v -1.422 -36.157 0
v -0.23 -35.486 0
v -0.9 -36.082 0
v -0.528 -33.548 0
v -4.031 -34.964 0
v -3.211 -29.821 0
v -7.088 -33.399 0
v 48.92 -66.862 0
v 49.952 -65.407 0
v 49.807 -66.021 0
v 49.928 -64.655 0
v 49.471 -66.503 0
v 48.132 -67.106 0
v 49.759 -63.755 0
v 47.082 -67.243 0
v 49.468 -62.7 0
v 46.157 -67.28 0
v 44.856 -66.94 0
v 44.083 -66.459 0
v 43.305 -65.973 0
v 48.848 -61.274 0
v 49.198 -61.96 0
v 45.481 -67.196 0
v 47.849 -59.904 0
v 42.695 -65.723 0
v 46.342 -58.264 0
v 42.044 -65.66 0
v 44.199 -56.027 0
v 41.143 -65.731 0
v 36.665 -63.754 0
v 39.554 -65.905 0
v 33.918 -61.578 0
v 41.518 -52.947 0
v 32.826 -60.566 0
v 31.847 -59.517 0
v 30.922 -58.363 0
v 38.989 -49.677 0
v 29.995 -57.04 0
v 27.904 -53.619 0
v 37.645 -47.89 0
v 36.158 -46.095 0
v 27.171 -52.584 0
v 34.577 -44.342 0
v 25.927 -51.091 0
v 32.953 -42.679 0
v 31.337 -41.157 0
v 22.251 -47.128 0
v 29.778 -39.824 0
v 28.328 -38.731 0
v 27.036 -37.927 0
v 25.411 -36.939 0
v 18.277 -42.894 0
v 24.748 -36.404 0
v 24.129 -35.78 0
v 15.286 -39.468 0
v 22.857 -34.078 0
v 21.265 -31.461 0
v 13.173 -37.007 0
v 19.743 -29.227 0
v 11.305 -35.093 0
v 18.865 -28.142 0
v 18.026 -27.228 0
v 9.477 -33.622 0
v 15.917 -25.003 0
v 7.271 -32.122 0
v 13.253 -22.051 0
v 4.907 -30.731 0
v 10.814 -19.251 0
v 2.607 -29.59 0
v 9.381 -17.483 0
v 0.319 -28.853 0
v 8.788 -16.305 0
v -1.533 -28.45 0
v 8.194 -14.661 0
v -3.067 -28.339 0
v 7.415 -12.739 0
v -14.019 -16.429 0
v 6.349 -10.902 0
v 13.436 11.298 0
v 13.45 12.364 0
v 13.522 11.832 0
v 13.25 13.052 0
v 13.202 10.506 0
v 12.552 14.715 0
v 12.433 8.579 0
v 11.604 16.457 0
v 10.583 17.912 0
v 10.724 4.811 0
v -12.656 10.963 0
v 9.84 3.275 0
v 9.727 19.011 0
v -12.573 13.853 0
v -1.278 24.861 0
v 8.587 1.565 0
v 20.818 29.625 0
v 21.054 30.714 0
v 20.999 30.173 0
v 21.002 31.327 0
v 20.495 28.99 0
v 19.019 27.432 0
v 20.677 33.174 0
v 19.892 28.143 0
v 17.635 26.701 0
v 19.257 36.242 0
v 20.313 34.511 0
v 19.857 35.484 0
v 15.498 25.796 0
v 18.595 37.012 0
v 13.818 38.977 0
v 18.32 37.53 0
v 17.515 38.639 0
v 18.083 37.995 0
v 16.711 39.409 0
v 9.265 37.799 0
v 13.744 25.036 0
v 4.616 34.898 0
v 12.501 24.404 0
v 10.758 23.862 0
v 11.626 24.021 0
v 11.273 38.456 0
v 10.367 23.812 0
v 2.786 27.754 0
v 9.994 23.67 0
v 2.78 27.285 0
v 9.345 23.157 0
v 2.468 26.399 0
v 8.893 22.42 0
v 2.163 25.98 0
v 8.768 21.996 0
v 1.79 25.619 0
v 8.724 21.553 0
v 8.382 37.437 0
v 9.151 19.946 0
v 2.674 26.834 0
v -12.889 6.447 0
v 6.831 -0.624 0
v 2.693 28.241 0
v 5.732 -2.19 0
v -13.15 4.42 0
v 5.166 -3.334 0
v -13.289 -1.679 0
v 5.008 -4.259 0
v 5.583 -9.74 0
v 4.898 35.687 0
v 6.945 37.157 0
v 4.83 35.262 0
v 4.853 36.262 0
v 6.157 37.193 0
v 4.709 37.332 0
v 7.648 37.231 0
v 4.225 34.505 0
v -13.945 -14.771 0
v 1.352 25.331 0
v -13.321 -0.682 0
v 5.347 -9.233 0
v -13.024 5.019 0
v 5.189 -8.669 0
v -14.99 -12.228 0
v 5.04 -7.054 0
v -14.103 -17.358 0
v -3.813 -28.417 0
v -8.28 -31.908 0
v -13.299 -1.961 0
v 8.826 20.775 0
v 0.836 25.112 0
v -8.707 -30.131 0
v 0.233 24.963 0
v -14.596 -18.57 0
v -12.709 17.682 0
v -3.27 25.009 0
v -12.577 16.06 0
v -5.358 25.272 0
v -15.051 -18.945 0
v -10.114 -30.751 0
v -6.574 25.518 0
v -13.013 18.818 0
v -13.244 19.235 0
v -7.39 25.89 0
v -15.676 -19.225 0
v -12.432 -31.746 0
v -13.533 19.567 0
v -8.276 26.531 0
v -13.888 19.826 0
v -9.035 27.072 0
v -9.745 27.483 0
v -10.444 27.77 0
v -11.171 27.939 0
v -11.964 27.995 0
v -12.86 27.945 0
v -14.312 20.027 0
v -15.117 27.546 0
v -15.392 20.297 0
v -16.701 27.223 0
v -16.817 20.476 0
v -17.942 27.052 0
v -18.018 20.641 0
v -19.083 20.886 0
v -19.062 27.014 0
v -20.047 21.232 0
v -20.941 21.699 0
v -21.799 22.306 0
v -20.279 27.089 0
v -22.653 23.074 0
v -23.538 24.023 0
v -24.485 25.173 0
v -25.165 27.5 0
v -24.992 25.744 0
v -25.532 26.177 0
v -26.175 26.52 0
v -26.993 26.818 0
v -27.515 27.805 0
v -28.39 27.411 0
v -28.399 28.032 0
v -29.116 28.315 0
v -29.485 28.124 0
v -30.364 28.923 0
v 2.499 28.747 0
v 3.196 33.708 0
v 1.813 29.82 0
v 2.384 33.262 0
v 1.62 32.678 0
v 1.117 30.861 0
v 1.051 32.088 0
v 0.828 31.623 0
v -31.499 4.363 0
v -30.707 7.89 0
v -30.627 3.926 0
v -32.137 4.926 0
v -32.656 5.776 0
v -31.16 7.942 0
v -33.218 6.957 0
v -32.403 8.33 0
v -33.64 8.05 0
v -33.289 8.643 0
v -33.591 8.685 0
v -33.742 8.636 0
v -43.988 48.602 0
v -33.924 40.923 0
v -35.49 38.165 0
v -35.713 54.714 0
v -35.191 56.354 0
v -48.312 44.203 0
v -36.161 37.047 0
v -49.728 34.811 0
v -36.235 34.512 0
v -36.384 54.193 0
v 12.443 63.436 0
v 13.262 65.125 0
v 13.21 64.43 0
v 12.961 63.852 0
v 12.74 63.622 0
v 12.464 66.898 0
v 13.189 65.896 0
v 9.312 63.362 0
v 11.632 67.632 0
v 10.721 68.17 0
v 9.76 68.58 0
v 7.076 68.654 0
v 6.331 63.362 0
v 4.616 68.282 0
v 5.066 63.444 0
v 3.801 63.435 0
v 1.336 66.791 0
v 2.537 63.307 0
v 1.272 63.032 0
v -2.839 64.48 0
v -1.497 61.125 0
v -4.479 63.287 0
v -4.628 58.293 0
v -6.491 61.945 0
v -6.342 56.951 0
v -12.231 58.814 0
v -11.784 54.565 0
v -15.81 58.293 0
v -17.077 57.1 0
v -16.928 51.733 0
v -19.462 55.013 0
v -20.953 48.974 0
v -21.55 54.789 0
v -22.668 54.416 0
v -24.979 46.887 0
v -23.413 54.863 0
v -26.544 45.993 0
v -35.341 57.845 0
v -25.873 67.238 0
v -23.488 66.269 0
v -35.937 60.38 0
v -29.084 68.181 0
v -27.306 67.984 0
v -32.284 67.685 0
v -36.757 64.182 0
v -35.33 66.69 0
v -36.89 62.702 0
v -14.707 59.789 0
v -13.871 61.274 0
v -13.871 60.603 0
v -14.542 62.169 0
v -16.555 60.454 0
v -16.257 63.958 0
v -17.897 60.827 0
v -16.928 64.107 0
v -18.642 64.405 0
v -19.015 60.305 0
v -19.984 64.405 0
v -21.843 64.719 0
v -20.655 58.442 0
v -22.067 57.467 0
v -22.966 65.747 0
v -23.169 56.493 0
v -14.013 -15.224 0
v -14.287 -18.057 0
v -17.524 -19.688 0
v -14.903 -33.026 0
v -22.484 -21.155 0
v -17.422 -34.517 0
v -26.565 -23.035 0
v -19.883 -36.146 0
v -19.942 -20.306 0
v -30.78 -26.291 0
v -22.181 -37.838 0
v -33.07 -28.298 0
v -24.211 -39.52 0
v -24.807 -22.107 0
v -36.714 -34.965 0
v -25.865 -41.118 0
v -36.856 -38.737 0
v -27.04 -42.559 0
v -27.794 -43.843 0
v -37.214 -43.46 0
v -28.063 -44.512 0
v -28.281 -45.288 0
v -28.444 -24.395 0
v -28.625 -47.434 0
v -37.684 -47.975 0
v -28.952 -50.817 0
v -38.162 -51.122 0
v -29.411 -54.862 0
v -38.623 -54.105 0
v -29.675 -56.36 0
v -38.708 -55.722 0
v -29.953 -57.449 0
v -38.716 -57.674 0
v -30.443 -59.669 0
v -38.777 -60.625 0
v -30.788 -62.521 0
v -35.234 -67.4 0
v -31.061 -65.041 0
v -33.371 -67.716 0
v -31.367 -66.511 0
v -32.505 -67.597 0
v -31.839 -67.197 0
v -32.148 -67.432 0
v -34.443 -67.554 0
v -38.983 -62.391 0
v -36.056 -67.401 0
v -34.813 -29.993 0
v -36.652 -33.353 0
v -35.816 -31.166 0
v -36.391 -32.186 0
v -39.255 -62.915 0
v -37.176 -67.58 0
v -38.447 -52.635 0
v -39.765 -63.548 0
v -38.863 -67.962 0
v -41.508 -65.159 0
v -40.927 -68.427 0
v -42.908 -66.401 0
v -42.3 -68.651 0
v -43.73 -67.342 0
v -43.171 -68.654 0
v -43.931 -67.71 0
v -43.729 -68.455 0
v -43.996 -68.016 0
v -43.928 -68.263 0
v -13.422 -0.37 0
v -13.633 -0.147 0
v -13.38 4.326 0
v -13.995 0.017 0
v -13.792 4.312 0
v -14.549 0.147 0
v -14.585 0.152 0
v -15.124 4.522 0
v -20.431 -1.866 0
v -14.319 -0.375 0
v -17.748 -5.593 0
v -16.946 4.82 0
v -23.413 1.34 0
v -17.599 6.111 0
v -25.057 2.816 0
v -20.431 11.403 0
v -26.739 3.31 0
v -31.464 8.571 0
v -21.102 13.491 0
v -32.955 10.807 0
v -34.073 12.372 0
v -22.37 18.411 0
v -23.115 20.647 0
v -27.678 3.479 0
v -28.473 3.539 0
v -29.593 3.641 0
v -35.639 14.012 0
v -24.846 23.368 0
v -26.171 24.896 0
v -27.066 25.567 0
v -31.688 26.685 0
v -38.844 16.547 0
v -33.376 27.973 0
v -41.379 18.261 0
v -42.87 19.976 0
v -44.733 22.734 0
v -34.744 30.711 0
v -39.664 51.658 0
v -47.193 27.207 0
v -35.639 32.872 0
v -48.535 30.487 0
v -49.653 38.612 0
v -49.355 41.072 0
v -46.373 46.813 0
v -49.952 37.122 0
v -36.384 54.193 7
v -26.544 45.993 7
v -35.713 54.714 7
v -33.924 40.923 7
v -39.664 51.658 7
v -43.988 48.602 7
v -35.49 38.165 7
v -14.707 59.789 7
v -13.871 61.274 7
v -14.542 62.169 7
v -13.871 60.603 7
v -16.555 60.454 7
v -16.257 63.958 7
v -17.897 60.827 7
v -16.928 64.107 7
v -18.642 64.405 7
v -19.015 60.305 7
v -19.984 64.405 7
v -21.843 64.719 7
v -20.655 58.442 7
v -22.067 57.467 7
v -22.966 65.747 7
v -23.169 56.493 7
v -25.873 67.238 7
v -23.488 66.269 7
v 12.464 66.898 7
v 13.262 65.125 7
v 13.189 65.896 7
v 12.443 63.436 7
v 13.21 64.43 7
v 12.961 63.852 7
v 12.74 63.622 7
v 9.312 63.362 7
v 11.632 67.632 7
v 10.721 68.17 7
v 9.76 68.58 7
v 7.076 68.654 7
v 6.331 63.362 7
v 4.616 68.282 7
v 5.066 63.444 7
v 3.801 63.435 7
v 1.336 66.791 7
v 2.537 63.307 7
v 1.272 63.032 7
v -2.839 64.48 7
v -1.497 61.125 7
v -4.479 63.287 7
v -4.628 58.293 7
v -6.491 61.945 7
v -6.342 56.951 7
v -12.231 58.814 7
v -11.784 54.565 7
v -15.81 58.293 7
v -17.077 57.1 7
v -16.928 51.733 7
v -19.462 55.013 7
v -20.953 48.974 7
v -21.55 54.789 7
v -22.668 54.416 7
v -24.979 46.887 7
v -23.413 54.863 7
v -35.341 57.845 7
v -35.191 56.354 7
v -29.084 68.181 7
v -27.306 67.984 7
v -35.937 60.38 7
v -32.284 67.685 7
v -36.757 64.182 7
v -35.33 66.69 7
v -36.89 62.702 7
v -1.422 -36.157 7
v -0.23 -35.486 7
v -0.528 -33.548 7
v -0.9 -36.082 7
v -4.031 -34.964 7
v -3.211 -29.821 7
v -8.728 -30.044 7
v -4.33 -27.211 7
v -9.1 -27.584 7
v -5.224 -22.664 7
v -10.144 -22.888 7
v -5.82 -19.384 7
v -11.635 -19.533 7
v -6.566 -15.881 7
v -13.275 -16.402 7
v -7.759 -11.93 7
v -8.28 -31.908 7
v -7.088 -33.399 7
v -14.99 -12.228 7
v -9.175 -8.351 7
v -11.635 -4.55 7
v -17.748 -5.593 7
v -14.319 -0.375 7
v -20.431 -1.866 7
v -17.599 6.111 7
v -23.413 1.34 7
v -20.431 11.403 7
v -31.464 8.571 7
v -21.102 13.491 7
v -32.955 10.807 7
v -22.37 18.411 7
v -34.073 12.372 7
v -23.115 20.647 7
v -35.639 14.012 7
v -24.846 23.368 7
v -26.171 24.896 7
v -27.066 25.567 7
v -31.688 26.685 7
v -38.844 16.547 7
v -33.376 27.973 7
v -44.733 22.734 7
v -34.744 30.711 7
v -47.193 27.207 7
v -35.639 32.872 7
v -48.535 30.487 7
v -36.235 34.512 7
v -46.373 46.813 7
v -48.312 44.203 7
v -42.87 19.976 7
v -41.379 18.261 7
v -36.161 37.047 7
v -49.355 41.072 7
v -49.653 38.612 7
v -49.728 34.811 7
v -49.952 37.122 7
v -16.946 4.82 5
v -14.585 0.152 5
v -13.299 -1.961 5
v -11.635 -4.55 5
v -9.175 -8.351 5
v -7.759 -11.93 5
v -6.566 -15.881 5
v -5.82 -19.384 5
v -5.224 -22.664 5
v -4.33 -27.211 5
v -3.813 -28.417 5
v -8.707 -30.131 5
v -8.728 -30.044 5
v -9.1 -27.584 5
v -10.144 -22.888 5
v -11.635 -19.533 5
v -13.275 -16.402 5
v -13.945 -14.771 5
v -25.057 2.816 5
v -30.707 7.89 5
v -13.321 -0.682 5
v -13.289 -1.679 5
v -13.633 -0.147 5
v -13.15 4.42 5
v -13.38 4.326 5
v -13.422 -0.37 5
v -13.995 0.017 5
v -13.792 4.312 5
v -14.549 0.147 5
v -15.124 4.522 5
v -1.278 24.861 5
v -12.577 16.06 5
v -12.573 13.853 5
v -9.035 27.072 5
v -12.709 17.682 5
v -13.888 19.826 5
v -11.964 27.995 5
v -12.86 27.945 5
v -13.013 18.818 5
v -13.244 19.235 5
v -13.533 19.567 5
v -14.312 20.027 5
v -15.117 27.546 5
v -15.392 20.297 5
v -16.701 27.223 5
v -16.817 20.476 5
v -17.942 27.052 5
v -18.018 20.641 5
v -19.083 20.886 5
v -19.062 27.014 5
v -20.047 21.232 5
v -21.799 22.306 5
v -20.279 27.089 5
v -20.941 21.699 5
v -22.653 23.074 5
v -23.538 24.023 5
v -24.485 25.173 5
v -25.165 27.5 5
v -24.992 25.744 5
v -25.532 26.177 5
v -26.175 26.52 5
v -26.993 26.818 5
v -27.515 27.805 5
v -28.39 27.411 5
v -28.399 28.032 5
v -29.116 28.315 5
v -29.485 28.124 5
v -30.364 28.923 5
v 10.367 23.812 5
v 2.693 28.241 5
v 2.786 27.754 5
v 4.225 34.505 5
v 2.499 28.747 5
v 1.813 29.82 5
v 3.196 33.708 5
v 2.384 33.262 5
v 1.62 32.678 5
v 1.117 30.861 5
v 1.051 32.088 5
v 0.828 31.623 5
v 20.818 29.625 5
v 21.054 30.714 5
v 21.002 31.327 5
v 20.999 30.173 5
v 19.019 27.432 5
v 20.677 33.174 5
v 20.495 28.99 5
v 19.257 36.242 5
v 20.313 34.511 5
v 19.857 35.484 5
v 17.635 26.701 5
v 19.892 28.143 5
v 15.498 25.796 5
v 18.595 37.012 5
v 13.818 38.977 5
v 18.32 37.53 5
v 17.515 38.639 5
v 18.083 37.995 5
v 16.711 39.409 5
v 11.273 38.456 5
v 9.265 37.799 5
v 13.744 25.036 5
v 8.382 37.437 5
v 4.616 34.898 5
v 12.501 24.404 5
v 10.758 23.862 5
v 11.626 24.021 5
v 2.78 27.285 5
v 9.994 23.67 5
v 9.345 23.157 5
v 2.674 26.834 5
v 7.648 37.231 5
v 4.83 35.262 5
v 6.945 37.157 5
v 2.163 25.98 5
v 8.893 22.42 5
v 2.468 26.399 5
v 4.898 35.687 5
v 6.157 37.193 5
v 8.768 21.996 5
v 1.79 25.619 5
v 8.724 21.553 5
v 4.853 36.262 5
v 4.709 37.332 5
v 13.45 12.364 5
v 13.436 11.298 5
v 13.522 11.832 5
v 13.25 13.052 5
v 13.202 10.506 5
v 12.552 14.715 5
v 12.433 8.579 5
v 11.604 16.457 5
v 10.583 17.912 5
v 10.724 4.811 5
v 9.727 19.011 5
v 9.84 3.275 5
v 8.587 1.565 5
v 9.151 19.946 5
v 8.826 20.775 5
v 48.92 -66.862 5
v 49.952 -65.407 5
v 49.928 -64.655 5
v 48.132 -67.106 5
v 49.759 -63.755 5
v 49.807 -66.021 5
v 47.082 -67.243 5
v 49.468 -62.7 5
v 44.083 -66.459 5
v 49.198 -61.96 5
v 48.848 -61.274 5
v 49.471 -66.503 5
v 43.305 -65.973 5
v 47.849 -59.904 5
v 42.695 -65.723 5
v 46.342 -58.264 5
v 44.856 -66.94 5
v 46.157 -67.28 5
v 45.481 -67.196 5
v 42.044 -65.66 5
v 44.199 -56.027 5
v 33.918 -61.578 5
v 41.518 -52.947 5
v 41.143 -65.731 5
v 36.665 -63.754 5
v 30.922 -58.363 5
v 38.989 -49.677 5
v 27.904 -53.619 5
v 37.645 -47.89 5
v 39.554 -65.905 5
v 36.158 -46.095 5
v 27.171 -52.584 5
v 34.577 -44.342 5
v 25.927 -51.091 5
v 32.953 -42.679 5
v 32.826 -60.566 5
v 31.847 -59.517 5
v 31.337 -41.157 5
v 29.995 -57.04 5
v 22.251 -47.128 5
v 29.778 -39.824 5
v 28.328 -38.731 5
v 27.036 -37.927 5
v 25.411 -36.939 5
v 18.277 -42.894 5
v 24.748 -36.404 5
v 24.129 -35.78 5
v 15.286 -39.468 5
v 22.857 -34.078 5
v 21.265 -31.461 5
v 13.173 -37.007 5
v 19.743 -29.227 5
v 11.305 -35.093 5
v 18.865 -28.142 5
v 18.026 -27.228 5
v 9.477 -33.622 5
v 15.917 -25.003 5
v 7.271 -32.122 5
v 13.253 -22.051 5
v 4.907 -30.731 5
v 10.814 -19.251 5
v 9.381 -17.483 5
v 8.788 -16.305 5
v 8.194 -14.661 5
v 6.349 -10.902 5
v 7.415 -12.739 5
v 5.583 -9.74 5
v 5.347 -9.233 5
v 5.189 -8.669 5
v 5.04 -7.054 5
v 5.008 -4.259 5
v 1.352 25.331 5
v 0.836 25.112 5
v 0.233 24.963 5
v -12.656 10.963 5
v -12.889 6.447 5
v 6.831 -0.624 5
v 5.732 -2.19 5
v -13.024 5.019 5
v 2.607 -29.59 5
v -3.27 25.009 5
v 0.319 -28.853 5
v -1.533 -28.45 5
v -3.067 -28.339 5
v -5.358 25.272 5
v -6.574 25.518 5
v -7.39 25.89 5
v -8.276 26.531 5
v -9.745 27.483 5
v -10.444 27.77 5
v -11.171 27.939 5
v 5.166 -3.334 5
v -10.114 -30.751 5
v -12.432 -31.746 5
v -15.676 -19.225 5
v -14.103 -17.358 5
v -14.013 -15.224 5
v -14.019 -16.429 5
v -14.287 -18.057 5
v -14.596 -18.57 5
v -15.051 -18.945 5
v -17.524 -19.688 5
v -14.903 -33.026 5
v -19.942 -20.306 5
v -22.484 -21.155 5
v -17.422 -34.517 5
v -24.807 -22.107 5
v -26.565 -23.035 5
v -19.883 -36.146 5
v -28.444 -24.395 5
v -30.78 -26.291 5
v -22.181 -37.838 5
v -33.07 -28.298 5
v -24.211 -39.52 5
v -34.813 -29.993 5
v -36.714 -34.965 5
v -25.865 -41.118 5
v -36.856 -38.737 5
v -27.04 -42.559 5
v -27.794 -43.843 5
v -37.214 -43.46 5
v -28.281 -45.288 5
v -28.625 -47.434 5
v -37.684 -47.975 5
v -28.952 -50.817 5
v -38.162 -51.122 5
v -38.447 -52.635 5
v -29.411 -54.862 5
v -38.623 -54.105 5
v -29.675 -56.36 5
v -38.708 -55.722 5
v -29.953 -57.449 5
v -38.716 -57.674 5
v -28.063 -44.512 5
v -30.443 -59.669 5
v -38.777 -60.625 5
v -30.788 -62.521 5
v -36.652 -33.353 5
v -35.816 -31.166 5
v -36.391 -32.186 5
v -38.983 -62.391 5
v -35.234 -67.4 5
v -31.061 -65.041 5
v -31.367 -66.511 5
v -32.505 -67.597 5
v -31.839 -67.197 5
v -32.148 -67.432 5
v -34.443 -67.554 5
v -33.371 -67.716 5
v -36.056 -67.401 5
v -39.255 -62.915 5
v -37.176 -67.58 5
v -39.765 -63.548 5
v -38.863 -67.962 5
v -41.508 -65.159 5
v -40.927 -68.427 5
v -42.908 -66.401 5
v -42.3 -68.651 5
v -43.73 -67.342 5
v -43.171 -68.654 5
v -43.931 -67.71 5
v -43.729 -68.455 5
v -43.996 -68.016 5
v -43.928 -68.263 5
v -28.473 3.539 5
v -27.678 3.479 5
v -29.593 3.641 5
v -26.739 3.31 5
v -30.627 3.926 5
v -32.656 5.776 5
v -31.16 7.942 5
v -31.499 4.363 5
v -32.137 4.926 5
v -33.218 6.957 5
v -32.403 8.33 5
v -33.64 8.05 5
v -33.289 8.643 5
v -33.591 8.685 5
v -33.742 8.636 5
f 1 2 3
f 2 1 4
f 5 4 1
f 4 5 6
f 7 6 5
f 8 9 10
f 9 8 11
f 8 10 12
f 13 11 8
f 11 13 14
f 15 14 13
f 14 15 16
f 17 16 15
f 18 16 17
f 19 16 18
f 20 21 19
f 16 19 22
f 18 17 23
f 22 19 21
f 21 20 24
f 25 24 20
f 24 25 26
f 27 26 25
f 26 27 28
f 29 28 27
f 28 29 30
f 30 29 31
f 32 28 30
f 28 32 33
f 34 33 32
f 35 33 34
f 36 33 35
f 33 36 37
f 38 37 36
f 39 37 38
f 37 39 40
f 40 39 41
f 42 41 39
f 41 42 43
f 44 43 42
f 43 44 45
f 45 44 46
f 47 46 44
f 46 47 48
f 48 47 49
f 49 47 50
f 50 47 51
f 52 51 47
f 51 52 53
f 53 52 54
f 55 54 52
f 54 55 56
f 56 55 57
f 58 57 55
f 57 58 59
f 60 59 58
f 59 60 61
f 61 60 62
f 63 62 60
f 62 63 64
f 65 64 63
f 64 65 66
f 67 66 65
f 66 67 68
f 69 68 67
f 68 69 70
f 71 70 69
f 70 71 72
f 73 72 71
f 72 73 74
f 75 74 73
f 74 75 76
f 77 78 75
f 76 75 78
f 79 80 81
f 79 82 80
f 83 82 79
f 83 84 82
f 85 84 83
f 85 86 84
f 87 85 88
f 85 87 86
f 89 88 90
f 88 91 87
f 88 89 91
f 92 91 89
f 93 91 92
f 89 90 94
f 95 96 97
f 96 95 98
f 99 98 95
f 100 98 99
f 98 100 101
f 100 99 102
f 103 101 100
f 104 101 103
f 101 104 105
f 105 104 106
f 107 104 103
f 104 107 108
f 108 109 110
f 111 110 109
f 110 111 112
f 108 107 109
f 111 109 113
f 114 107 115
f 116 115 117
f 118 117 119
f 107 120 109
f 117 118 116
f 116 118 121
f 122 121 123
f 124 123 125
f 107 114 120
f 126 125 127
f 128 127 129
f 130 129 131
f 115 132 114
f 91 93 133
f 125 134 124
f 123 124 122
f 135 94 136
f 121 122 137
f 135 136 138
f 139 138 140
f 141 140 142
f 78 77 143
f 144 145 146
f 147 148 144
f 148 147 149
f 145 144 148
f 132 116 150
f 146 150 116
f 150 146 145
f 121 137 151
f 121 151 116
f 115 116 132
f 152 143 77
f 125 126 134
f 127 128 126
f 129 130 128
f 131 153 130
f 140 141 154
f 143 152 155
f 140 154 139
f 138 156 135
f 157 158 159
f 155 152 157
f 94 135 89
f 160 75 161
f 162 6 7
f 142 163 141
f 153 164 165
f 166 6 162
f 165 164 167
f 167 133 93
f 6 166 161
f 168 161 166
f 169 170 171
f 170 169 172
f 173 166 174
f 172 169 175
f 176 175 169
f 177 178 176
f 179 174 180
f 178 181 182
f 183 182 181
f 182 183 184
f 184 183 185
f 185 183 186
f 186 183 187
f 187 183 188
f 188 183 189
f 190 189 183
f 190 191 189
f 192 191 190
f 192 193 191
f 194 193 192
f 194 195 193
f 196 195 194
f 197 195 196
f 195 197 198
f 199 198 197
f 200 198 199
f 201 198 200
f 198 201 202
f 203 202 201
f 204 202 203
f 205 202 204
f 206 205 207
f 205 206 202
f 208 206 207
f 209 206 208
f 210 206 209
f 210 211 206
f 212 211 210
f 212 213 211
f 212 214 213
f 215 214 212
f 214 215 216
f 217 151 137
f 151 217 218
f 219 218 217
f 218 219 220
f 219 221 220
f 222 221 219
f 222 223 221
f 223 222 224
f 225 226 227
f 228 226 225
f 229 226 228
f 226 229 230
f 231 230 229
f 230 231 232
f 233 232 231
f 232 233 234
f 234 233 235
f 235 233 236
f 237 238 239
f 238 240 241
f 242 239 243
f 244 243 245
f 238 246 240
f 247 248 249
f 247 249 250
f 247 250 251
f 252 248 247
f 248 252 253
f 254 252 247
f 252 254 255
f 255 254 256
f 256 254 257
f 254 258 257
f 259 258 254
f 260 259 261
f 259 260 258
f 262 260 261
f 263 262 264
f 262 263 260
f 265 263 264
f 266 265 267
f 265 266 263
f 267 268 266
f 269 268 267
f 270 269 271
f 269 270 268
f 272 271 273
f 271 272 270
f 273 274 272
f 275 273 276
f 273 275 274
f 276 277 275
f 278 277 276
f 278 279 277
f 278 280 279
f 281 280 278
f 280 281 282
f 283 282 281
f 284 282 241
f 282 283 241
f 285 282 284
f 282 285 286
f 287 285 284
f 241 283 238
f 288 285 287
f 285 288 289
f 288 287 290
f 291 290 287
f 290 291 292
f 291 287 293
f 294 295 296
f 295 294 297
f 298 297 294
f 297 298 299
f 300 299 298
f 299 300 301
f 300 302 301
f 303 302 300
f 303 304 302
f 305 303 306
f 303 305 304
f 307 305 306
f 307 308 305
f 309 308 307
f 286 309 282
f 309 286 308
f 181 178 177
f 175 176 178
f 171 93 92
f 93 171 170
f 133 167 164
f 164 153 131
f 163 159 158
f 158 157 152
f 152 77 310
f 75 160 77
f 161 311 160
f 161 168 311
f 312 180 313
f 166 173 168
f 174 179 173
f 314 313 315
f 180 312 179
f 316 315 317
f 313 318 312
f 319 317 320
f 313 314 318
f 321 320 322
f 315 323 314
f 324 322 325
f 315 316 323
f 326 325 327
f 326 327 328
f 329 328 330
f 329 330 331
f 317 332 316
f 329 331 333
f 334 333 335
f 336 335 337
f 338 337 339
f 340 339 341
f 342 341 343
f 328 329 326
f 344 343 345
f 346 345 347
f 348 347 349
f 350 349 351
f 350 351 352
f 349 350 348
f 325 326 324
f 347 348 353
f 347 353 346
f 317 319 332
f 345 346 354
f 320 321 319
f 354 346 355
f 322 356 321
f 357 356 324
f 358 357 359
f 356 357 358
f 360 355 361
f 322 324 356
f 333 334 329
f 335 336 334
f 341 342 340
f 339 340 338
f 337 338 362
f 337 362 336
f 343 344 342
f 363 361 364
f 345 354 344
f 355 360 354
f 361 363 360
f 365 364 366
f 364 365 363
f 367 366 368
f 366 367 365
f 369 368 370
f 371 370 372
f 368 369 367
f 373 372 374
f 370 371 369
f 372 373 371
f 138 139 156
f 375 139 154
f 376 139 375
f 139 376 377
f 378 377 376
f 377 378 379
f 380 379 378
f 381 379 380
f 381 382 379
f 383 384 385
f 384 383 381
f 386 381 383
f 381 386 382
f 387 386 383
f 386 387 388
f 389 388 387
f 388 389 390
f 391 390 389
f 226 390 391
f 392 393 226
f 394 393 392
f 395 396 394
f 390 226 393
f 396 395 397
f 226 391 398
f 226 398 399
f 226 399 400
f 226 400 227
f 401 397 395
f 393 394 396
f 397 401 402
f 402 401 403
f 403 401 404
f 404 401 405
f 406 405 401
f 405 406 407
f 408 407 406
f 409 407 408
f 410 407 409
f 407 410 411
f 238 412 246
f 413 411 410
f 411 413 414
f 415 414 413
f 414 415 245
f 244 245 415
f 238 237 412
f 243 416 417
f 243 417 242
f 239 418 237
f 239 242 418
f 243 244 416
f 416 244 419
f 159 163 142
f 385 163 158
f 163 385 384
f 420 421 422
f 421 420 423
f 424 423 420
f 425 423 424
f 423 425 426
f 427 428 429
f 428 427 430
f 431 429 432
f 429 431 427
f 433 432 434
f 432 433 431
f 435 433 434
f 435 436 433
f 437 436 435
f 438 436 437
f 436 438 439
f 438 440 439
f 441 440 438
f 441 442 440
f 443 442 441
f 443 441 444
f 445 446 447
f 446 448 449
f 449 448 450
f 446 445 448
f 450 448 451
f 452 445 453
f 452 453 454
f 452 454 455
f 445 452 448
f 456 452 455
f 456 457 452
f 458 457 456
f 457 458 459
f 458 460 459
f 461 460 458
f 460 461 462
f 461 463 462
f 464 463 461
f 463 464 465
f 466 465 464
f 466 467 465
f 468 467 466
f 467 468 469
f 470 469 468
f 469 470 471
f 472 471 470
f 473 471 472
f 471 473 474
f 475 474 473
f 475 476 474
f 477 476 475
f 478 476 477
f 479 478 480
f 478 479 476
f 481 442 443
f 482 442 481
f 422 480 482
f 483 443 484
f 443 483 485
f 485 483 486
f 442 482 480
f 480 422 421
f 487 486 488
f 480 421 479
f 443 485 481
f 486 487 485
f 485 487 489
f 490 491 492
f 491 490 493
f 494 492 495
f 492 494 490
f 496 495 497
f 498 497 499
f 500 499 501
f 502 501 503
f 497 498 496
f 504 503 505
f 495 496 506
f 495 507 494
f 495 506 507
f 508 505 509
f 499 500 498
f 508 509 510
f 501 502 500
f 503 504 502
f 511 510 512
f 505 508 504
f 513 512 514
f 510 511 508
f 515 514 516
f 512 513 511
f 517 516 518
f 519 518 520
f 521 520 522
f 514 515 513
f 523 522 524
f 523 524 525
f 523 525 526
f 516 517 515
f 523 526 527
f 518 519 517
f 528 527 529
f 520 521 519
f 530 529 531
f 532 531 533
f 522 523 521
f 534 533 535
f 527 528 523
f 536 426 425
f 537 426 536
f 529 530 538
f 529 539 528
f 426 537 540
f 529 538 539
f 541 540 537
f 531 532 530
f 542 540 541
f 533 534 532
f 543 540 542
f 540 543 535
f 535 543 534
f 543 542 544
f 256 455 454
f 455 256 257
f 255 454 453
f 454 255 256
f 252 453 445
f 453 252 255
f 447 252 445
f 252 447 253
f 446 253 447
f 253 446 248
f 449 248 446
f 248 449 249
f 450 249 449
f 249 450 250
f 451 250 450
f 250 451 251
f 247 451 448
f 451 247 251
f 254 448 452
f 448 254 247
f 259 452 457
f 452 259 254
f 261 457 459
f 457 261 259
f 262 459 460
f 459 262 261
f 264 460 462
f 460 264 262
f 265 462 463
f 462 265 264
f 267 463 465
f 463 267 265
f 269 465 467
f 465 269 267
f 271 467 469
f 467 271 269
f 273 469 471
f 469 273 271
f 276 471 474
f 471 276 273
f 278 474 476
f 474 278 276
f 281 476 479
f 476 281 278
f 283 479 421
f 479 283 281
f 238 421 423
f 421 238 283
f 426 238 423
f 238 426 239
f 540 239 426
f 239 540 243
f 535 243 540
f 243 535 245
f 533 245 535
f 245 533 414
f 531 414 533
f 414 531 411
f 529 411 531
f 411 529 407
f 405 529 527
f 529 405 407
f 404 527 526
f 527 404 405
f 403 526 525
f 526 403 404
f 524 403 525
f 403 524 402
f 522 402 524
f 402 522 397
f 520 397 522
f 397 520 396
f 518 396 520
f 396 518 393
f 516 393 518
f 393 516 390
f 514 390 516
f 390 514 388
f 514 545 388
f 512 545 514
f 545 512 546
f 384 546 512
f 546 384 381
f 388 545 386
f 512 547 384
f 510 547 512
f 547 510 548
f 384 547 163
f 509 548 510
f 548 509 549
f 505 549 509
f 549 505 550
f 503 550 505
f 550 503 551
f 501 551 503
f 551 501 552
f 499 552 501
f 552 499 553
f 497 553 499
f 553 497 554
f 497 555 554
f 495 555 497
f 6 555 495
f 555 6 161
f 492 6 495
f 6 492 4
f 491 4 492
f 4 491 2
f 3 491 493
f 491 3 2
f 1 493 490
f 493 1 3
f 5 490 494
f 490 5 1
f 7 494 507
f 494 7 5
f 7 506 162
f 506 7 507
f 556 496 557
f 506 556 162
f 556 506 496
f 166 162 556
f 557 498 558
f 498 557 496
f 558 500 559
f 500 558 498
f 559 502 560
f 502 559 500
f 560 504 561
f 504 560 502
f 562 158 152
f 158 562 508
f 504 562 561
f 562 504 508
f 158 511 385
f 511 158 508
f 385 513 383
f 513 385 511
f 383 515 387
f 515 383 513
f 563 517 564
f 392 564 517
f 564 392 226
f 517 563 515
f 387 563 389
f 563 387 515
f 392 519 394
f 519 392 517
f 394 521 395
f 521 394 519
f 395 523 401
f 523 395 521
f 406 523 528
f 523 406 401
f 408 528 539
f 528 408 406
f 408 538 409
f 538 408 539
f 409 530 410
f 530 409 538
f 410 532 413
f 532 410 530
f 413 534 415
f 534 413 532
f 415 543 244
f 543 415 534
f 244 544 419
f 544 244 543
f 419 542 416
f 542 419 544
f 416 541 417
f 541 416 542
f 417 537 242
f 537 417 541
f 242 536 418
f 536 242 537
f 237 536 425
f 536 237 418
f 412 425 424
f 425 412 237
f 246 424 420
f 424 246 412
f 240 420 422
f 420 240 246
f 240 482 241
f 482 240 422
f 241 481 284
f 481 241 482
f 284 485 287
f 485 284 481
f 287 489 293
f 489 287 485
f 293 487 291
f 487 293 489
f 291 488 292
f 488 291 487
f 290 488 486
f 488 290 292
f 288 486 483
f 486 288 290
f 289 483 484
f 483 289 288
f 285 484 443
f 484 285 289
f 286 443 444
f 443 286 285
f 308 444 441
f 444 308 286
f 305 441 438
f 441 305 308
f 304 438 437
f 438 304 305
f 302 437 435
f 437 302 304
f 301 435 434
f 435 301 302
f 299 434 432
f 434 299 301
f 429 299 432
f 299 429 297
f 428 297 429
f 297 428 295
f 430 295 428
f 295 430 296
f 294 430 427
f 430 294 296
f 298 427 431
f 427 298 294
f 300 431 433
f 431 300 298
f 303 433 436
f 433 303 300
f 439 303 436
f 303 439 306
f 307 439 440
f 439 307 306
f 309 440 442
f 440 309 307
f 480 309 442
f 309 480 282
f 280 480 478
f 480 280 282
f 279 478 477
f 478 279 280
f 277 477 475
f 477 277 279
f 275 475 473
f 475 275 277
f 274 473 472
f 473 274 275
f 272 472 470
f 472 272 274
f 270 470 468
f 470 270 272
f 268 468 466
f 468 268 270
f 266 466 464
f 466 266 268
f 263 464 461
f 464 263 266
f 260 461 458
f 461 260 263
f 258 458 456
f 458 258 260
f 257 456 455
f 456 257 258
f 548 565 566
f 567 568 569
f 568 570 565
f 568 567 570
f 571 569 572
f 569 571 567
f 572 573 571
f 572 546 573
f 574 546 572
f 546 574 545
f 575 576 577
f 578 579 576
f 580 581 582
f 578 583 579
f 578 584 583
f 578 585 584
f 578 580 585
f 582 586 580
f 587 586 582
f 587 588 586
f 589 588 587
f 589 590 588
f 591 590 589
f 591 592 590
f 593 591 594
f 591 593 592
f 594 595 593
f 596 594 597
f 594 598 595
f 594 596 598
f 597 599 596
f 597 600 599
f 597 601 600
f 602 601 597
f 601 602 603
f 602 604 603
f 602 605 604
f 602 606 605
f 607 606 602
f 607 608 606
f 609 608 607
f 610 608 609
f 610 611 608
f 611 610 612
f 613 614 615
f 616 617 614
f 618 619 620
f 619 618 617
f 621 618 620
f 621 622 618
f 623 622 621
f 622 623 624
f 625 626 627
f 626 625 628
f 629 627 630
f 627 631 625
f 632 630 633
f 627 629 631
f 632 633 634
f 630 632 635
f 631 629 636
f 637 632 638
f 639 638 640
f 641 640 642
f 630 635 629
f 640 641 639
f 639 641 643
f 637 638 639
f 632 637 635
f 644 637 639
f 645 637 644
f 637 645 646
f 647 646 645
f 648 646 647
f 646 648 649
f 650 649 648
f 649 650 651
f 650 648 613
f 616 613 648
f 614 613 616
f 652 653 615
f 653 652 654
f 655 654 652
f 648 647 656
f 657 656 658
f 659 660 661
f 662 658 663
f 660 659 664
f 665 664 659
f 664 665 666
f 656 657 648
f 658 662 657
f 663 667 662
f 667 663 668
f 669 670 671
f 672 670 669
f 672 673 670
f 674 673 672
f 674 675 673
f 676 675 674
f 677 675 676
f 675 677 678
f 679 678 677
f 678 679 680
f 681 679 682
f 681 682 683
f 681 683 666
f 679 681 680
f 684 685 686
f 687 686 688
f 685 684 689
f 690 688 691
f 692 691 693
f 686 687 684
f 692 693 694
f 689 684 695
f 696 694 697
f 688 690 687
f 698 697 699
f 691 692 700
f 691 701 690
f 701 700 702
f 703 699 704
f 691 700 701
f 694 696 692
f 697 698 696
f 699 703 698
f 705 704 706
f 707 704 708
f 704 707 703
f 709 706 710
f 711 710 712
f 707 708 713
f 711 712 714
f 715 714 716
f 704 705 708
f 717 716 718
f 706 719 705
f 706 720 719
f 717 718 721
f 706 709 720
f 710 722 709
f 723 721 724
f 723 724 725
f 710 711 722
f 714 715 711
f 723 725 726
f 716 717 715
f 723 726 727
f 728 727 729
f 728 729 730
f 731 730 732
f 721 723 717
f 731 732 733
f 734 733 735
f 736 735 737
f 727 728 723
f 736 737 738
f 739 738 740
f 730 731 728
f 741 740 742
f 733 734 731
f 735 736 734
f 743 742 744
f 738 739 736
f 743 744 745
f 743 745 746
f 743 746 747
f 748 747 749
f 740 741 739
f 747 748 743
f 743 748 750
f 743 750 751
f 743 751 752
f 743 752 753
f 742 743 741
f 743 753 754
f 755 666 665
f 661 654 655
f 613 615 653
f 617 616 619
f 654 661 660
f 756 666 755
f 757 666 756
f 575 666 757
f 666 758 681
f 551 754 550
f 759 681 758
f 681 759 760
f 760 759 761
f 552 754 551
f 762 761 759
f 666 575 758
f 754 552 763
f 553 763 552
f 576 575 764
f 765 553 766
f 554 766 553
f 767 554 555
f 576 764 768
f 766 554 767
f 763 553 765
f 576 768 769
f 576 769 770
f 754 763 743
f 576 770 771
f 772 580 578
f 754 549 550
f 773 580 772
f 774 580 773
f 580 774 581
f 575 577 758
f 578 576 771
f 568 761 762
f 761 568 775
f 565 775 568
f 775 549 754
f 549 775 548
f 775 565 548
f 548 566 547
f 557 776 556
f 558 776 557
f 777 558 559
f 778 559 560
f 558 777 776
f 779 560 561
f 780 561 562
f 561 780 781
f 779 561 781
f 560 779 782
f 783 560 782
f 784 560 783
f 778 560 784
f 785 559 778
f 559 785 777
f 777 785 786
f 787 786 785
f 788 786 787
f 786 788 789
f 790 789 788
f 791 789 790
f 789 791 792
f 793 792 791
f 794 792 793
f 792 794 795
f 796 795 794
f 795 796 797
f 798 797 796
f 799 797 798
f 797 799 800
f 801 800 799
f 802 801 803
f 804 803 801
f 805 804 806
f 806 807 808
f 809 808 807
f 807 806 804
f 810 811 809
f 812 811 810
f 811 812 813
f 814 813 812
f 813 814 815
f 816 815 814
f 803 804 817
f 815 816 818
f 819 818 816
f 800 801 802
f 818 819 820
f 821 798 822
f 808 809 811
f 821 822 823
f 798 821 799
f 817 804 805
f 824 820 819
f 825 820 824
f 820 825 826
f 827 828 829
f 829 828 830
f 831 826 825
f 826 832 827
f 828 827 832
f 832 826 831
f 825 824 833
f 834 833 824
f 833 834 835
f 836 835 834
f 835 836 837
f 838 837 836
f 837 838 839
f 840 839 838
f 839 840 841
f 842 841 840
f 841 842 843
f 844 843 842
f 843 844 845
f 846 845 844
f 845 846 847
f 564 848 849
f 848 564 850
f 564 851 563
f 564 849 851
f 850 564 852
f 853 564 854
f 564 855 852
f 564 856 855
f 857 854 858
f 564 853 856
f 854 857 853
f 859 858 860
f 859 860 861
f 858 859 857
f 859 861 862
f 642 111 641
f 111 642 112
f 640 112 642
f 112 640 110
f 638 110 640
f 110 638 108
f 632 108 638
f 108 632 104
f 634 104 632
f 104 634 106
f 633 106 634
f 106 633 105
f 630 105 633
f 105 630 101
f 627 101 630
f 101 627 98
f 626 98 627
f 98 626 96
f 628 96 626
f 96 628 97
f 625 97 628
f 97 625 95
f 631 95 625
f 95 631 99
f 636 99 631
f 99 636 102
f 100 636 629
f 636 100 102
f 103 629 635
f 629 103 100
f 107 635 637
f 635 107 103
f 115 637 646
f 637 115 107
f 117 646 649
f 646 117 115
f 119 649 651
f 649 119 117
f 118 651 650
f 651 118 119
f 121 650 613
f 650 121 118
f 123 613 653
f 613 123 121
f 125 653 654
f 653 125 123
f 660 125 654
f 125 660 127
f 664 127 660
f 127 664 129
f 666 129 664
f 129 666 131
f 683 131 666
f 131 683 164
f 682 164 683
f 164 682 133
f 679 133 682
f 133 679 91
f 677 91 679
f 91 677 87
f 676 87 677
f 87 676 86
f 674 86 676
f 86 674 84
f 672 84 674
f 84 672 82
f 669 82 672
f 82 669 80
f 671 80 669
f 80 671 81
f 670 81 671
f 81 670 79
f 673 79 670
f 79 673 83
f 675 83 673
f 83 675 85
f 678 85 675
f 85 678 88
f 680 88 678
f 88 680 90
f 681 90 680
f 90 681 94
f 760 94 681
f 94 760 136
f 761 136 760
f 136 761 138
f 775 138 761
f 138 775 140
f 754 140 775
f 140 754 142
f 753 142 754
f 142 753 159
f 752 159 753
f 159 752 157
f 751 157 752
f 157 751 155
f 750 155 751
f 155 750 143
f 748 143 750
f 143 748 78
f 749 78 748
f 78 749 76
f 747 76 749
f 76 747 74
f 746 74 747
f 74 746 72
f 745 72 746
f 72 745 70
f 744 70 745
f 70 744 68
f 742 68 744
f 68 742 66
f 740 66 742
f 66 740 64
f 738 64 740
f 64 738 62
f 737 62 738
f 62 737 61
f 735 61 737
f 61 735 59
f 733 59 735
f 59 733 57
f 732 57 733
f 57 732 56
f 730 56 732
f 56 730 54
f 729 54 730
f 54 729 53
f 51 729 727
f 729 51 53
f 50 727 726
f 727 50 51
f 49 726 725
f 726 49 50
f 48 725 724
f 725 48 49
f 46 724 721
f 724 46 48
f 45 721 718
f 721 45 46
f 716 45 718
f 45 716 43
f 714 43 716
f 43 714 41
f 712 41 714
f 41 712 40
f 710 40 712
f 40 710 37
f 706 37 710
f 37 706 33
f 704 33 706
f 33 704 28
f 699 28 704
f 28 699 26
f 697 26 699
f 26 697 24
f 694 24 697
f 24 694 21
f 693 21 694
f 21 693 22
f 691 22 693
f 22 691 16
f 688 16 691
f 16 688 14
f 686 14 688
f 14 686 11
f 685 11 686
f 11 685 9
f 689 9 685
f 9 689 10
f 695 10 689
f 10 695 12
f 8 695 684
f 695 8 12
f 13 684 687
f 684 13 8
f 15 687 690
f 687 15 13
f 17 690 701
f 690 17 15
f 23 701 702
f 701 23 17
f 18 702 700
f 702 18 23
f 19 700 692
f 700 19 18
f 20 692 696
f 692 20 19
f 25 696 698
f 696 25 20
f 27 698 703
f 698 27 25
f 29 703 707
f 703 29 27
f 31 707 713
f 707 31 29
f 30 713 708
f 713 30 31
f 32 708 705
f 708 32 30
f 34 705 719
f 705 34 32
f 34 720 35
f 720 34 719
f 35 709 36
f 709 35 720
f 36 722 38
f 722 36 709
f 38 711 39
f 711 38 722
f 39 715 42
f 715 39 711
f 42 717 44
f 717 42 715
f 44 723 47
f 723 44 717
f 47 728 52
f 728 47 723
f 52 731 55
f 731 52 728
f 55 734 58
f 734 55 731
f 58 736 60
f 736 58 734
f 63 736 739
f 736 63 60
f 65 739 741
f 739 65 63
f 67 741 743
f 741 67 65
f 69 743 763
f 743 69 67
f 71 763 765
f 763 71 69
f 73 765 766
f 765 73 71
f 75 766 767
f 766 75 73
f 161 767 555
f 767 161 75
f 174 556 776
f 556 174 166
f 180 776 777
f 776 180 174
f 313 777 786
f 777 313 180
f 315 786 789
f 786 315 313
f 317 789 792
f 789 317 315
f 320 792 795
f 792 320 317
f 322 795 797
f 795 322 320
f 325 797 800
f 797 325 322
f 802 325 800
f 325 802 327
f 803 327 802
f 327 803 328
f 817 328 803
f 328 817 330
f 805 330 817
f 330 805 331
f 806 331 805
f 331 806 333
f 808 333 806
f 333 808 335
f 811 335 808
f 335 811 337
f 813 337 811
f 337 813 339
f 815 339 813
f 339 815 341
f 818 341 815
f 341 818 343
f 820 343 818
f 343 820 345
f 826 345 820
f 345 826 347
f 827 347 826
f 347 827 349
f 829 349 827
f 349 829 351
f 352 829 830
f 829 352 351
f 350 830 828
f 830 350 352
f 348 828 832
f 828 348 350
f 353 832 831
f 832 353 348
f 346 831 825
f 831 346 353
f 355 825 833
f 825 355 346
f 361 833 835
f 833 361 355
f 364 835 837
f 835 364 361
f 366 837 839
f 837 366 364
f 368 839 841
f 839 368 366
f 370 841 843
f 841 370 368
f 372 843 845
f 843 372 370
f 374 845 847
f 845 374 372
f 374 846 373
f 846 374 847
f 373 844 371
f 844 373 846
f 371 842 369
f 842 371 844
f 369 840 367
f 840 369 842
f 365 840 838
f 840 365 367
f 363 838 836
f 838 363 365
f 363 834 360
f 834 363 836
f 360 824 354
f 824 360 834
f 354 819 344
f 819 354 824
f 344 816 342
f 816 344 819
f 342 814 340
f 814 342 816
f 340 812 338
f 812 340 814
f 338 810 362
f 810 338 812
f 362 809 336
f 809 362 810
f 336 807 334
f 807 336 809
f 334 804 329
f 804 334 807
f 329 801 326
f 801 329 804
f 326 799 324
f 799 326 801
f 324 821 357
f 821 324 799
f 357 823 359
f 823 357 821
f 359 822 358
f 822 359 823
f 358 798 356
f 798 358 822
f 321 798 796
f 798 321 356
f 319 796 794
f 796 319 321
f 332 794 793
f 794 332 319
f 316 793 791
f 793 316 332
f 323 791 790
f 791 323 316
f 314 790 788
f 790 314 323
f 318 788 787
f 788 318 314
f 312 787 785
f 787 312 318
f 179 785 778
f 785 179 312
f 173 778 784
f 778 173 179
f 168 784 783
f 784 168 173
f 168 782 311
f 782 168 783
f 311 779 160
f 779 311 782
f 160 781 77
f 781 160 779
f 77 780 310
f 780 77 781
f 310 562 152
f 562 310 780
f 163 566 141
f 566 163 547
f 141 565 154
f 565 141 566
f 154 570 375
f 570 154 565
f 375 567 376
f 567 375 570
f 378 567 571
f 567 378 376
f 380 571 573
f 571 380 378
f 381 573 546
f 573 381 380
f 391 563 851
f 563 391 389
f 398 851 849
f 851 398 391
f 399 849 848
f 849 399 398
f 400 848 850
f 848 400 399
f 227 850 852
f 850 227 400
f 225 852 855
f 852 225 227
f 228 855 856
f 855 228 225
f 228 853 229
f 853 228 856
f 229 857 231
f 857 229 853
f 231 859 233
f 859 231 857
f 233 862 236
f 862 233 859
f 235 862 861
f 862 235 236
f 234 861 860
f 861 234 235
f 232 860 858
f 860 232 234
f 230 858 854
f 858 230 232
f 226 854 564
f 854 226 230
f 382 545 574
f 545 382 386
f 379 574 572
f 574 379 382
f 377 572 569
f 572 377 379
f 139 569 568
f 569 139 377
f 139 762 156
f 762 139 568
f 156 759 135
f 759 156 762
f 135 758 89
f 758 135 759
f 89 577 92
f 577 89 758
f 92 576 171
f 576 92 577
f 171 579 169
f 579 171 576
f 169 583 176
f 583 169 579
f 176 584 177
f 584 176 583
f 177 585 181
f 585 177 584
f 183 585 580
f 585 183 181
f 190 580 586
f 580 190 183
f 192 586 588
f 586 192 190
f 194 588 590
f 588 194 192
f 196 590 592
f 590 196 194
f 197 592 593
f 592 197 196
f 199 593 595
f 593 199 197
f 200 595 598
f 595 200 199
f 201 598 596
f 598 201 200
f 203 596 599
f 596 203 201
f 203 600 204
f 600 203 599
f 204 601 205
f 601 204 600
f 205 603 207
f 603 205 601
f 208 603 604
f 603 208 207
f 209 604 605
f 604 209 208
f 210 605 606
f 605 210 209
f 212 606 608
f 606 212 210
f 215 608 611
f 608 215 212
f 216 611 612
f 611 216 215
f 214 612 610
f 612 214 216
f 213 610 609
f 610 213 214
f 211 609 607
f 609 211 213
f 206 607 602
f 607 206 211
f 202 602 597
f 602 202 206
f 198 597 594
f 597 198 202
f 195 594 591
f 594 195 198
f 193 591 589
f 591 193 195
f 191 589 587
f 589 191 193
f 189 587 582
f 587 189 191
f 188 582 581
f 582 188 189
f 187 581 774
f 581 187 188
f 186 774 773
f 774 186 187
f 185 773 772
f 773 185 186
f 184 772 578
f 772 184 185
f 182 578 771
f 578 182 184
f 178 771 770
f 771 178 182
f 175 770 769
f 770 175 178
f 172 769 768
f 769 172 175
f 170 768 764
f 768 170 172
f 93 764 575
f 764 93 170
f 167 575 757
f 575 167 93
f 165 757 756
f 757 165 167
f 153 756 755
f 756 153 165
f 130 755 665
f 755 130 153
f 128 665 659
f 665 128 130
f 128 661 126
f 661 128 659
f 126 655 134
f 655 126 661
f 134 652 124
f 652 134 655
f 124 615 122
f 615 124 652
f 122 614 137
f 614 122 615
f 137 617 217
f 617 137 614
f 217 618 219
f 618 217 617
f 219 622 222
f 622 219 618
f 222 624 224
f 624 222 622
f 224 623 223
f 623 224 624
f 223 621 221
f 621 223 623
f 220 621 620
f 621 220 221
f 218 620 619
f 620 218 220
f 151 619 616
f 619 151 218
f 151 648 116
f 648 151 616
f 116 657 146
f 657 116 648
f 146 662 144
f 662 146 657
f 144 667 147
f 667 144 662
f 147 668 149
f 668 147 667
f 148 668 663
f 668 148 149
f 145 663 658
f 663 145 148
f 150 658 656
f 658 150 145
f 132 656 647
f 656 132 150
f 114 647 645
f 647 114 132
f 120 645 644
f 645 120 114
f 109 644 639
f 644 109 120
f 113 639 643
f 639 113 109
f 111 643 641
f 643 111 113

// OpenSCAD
// Module names are of the form poly_<inkscape-path-id>().  As a result,
// you can associate a polygon in this OpenSCAD program with the corresponding
// SVG element in the Inkscape document by looking for the XML element with
// the attribute id="inkscape-path-id".

// fudge value is used to ensure that subtracted solids are a tad taller
// in the z dimension than the polygon being subtracted from.  This helps
// keep the resulting .stl file manifold.
fudge = 0.1;

module poly_path3032(h)
{
  scale([25.4/90, -25.4/90, 1]) union()
  {
    linear_extrude(height=h)
      polygon([[-0.813211,125.738010],[-1.869761,118.870400],[-11.378761,105.663470],[-15.340841,96.418610],[-18.510501,80.306150],[-20.623611,68.684050],[-23.265001,56.269530],[-27.491221,42.270180],[-32.509851,29.591520],[-41.226431,16.120440],[-50.735431,1.328680],[-62.357531,-21.651390],[-72.394801,-40.405240],[-74.772051,-47.801120],[-79.262407,-65.234280],[-81.903794,-73.158440],[-88.038027,-82.801050],[-92.733481,-88.214350],[-95.903146,-90.591600],[-112.279746,-94.553680],[-118.261711,-99.118620],[-123.109433,-108.817170],[-126.279098,-116.477190],[-128.392208,-122.288240],[-128.128069,-131.268960],[-125.750821,-135.231040],[-120.203908,-145.004171],[-94.054175,-162.965603],[-88.507262,-166.135268],[-74.243771,-173.531152],[-59.980281,-183.304284],[-41.754711,-193.341555],[-22.472581,-201.793994],[-16.397391,-206.548491],[-5.303571,-216.585762],[4.506859,-223.341498],[8.987893,-224.316743],[13.468929,-224.769503],[17.949965,-224.800368],[22.430999,-224.509924],[32.996549,-224.509924],[44.090369,-224.774062],[45.142133,-225.430681],[45.924425,-226.248982],[46.807204,-228.294668],[46.991913,-230.759195],[46.731759,-233.490640],[44.162568,-237.038902],[41.215417,-239.642259],[37.988841,-241.547055],[34.581379,-242.999633],[25.072389,-243.263772],[16.355809,-241.943078],[4.733699,-236.660304],[-10.058061,-228.472004],[-15.869111,-224.245785],[-23.000861,-219.491288],[-43.339541,-208.397462],[-56.018201,-206.548491],[-60.508561,-202.322272],[-68.961001,-194.926388],[-76.356881,-194.133972],[-80.318962,-192.813278],[-82.960349,-194.398110],[-82.093353,-200.171871],[-78.189501,-203.624320],[-73.187221,-207.076769],[-67.376161,-213.680236],[-63.414081,-215.529207],[-58.659591,-214.208514],[-52.112051,-211.849911],[-49.150591,-214.736791],[-49.150591,-217.114040],[-51.527841,-220.283704],[-57.603031,-226.623033],[-59.980281,-227.151311],[-66.055471,-228.207866],[-70.809971,-228.207866],[-77.394791,-229.320355],[-81.375517,-232.962362],[-83.224488,-234.811333],[-91.676927,-238.245136],[-96.754605,-240.886524],[-103.053537,-241.585714],[-114.392856,-239.829969],[-125.185253,-236.302940],[-130.241179,-227.415449],[-130.713521,-222.173072],[-127.335653,-213.944375],[-125.222543,-204.963659],[-124.694266,-199.680885],[-126.543237,-193.869833],[-128.920485,-192.020862],[-140.542589,-183.040146],[-155.862634,-172.210458],[-164.315073,-165.871129],[-171.182679,-156.626274],[-174.880621,-145.532448],[-175.937176,-136.815870],[-176.993731,-131.533100],[-176.201315,-123.344800],[-171.975095,-108.024750],[-167.220598,-96.402650],[-158.504021,-80.554320],[-151.900553,-70.781190],[-146.617779,-64.706000],[-137.637063,-58.630810],[-126.279098,-49.650100],[-120.732185,-43.839040],[-116.770104,-38.292130],[-111.487330,-30.367970],[-82.960349,-4.746510],[-72.394801,6.611450],[-62.885811,19.818390],[-53.112671,43.326730],[-47.037481,58.118500],[-41.226431,69.212330],[-35.943661,81.098570],[-32.245721,97.739310],[-30.925021,106.455880],[-29.340191,113.059350],[-25.113971,118.342130],[-14.284281,123.889040],[-5.039431,128.115260],[-3.190461,127.851120]]);
  }
}

module poly_path2988(h)
{
  scale([25.4/90, -25.4/90, 1]) union()
  {
    linear_extrude(height=h)
      polygon([[-137.702053,240.811920],[-131.724249,239.456295],[-127.756139,238.821688],[-124.845901,238.820054],[-122.041714,239.363350],[-118.244063,239.937591],[-115.175877,239.518258],[-113.908655,238.933739],[-112.815788,238.098113],[-111.142434,235.669920],[-110.059476,230.461267],[-109.092330,221.530190],[-107.868682,211.425773],[-106.131745,203.558620],[-105.147334,199.700517],[-104.212700,194.394699],[-102.586108,180.058620],[-101.428890,168.071559],[-100.208132,160.470074],[-99.435987,157.718276],[-98.482431,155.348095],[-95.810387,150.799550],[-91.648486,145.693842],[-85.785500,140.030624],[-78.595581,134.070915],[-70.452880,128.075735],[-61.731550,122.306103],[-52.805744,117.023037],[-44.049613,112.487556],[-35.837311,108.960680],[-24.612000,104.014085],[-20.037561,102.160379],[-15.595811,100.911705],[-10.867157,100.412039],[-5.432009,100.805358],[1.129226,102.235640],[9.236139,104.846860],[17.387864,108.890766],[25.762288,113.817768],[33.578905,119.134076],[40.057209,124.345900],[46.674608,131.125535],[54.164249,139.845900],[64.759589,151.986247],[78.843869,166.988390],[91.868637,181.032870],[96.276177,186.322334],[98.872749,189.988390],[106.280717,202.109567],[109.566332,206.798457],[112.843145,210.885379],[116.313741,214.604707],[120.180701,218.190814],[129.914049,225.900860],[140.152389,233.520490],[145.782539,232.903700],[148.975917,232.653941],[151.281718,232.878362],[153.441799,233.760834],[156.198019,235.485230],[158.938306,237.189387],[161.154415,238.097665],[163.549297,238.393659],[166.825899,238.260960],[170.544975,237.776199],[173.339129,236.911878],[175.290529,235.639603],[176.481340,233.930978],[176.993731,231.757607],[176.909866,229.091094],[176.311914,225.903044],[175.282039,222.165060],[174.322960,219.541730],[173.085112,217.112877],[169.544900,212.259714],[164.204976,206.447802],[156.608909,198.519370],[147.112735,187.608070],[138.150869,176.019370],[133.388323,169.688609],[128.117258,163.329207],[122.515966,157.116418],[116.762734,151.225499],[111.035854,145.831704],[105.513615,141.110287],[100.374307,137.236504],[95.796219,134.385610],[90.037981,130.884972],[87.688217,128.990062],[85.495219,126.779014],[80.991112,120.749281],[75.348839,111.477320],[69.954374,103.560819],[66.846041,99.715115],[63.871379,96.477320],[56.399555,88.593938],[46.960277,78.133542],[38.318470,68.212779],[33.239059,61.948300],[31.138112,57.773300],[29.033789,51.948300],[26.275358,45.139272],[22.495689,38.629500],[19.780759,34.511923],[18.947020,32.714716],[18.386713,30.716837],[17.859245,24.993877],[17.744049,15.092680],[18.304338,11.812409],[20.309804,7.758995],[24.202795,2.212519],[30.425659,-5.546940],[34.867449,-11.604350],[37.998929,-17.046940],[44.054999,-30.397740],[46.779493,-37.226890],[47.608293,-40.031815],[47.912689,-41.925950],[47.658712,-43.809247],[46.948924,-46.247470],[44.474788,-52.141485],[41.116017,-58.313577],[37.498349,-63.469330],[34.464982,-67.360341],[32.423868,-70.674558],[31.273579,-73.610624],[30.912689,-76.367180],[31.068731,-77.939742],[31.512015,-79.439963],[33.111272,-82.054063],[35.412374,-83.870852],[36.732967,-84.374433],[38.117239,-84.551700],[41.193852,-85.115210],[44.294659,-86.470030],[48.699890,-88.710547],[54.912689,-91.403480],[62.486164,-94.609036],[67.391305,-97.198965],[70.484021,-99.720253],[72.620219,-102.719890],[73.765193,-104.968945],[74.405428,-106.911612],[74.601714,-108.828356],[74.414839,-110.999640],[73.264754,-117.546613],[71.974798,-122.283255],[70.359505,-125.732117],[68.233409,-128.415750],[65.888149,-131.143768],[64.912689,-132.978650],[64.075339,-134.627583],[62.062139,-136.908520],[59.211589,-139.639510],[48.962759,-138.107080],[39.941988,-136.262970],[32.830439,-133.934300],[29.701281,-132.652378],[27.097580,-131.920797],[24.606795,-131.659125],[21.816379,-131.786930],[16.685809,-132.279920],[17.194449,-128.487730],[17.354591,-126.448925],[17.112864,-124.942876],[16.356105,-123.652664],[14.971149,-122.261370],[11.325949,-119.439450],[8.448358,-117.858233],[5.738509,-115.789855],[3.724586,-113.699337],[2.934769,-112.051700],[3.958333,-109.349422],[6.422399,-105.660970],[8.855679,-101.858235],[9.540799,-100.065050],[9.871957,-98.339793],[9.849438,-96.679317],[9.473529,-95.080476],[8.744517,-93.540122],[7.662689,-92.055110],[6.342859,-90.776398],[4.789089,-89.753872],[2.963146,-88.980701],[0.826797,-88.450055],[-4.530050,-88.089018],[-11.587311,-88.616120],[-18.985125,-89.546982],[-23.294525,-90.417573],[-26.184907,-91.735291],[-29.325671,-94.007530],[-32.012677,-95.923064],[-34.527774,-97.379692],[-37.005909,-98.397434],[-39.582032,-98.996311],[-42.391093,-99.196342],[-45.568040,-99.017547],[-53.565391,-97.603560],[-59.175291,-96.458961],[-63.574457,-95.853482],[-67.541093,-95.718220],[-71.853401,-95.984270],[-89.168077,-97.441400],[-97.495785,-98.519910],[-100.625888,-99.325249],[-103.168077,-100.328860],[-107.587320,-102.482500],[-104.473730,-99.653080],[-100.595726,-97.126680],[-95.644291,-95.025800],[-92.747185,-93.967991],[-90.468485,-92.754208],[-88.556085,-91.219102],[-86.757881,-89.197320],[-83.401743,-85.120590],[-80.267837,-81.757328],[-77.239317,-79.035947],[-74.199335,-76.884861],[-71.031043,-75.232484],[-67.617595,-74.007231],[-63.842144,-73.137515],[-59.587841,-72.551750],[-54.538289,-71.917562],[-50.710923,-70.960372],[-49.207746,-70.251339],[-47.952738,-69.330380],[-46.926772,-68.153770],[-46.110725,-66.677785],[-45.031877,-62.652787],[-44.563189,-56.905587],[-44.551652,-49.086385],[-44.844261,-38.845380],[-45.669506,-22.843423],[-46.146924,-17.783033],[-46.593631,-15.662480],[-47.409908,-15.328133],[-48.867813,-15.278047],[-53.587311,-16.024390],[-60.602588,-17.171091],[-69.043571,-18.048490],[-76.244019,-18.933035],[-82.636289,-20.415211],[-87.761992,-22.358684],[-89.706634,-23.460802],[-91.162738,-24.627120],[-92.928863,-27.521735],[-94.583086,-31.889140],[-96.053367,-35.802205],[-97.748124,-38.636165],[-99.364777,-40.006822],[-100.049258,-40.023351],[-100.600746,-39.529980],[-100.588280,-37.573637],[-99.558510,-34.487810],[-98.391273,-31.058027],[-98.509442,-29.998247],[-99.068251,-29.074680],[-100.048141,-28.373547],[-101.555486,-27.895300],[-105.662441,-27.593765],[-110.408928,-28.142685],[-114.814762,-29.514670],[-117.951703,-30.625175],[-119.023727,-30.772459],[-119.557302,-30.600270],[-119.196697,-28.524148],[-117.700295,-24.650632],[-115.710884,-20.465713],[-113.871255,-17.455380],[-111.611396,-15.460458],[-108.519609,-13.909908],[-104.857576,-12.902830],[-100.886980,-12.538320],[-98.073253,-12.327678],[-94.745568,-11.727748],[-87.087320,-9.479990],[-77.964782,-6.335034],[-70.513322,-4.069501],[-64.098858,-2.508400],[-58.087311,-1.476740],[-51.552516,-0.520111],[-49.590129,-0.059087],[-48.306382,0.519582],[-47.557751,1.312775],[-47.200712,2.417373],[-47.087311,5.948300],[-47.210345,9.436801],[-47.216057,9.542810],[-47.197925,9.381919],[-47.087311,18.448300],[-47.072011,25.198300],[-47.028511,32.331560],[-48.196921,44.266758],[-49.652431,53.943540],[-49.672460,58.213388],[-49.969553,61.505179],[-50.624482,63.980409],[-51.718018,65.800575],[-53.330934,67.127174],[-55.544002,68.121702],[-62.093681,69.760530],[-70.660006,71.951400],[-79.668521,74.959622],[-87.898050,78.333102],[-94.127419,81.619750],[-100.784373,86.438676],[-109.061241,93.155784],[-117.177247,100.268702],[-123.351618,106.275060],[-126.906424,110.430335],[-128.943796,114.044873],[-129.869015,118.178632],[-130.087360,123.891570],[-130.592198,137.258277],[-131.861337,153.992342],[-133.526714,169.988551],[-135.220265,181.141690],[-136.227906,186.500685],[-136.853324,191.710244],[-137.153080,197.439086],[-137.183736,204.355930],[-137.397996,214.814765],[-138.127773,221.070750],[-139.093215,222.926069],[-140.898263,225.170204],[-147.074324,230.876600],[-152.035657,235.278189],[-154.948014,238.613448],[-155.660714,239.918145],[-155.891037,241.000591],[-155.648938,241.875560],[-154.944372,242.557830],[-152.968686,243.263772],[-149.882799,243.253302],[-145.017129,242.458618],[-137.702093,240.811920]]);
  }
}

poly_path3032(7);
poly_path2988(5);
